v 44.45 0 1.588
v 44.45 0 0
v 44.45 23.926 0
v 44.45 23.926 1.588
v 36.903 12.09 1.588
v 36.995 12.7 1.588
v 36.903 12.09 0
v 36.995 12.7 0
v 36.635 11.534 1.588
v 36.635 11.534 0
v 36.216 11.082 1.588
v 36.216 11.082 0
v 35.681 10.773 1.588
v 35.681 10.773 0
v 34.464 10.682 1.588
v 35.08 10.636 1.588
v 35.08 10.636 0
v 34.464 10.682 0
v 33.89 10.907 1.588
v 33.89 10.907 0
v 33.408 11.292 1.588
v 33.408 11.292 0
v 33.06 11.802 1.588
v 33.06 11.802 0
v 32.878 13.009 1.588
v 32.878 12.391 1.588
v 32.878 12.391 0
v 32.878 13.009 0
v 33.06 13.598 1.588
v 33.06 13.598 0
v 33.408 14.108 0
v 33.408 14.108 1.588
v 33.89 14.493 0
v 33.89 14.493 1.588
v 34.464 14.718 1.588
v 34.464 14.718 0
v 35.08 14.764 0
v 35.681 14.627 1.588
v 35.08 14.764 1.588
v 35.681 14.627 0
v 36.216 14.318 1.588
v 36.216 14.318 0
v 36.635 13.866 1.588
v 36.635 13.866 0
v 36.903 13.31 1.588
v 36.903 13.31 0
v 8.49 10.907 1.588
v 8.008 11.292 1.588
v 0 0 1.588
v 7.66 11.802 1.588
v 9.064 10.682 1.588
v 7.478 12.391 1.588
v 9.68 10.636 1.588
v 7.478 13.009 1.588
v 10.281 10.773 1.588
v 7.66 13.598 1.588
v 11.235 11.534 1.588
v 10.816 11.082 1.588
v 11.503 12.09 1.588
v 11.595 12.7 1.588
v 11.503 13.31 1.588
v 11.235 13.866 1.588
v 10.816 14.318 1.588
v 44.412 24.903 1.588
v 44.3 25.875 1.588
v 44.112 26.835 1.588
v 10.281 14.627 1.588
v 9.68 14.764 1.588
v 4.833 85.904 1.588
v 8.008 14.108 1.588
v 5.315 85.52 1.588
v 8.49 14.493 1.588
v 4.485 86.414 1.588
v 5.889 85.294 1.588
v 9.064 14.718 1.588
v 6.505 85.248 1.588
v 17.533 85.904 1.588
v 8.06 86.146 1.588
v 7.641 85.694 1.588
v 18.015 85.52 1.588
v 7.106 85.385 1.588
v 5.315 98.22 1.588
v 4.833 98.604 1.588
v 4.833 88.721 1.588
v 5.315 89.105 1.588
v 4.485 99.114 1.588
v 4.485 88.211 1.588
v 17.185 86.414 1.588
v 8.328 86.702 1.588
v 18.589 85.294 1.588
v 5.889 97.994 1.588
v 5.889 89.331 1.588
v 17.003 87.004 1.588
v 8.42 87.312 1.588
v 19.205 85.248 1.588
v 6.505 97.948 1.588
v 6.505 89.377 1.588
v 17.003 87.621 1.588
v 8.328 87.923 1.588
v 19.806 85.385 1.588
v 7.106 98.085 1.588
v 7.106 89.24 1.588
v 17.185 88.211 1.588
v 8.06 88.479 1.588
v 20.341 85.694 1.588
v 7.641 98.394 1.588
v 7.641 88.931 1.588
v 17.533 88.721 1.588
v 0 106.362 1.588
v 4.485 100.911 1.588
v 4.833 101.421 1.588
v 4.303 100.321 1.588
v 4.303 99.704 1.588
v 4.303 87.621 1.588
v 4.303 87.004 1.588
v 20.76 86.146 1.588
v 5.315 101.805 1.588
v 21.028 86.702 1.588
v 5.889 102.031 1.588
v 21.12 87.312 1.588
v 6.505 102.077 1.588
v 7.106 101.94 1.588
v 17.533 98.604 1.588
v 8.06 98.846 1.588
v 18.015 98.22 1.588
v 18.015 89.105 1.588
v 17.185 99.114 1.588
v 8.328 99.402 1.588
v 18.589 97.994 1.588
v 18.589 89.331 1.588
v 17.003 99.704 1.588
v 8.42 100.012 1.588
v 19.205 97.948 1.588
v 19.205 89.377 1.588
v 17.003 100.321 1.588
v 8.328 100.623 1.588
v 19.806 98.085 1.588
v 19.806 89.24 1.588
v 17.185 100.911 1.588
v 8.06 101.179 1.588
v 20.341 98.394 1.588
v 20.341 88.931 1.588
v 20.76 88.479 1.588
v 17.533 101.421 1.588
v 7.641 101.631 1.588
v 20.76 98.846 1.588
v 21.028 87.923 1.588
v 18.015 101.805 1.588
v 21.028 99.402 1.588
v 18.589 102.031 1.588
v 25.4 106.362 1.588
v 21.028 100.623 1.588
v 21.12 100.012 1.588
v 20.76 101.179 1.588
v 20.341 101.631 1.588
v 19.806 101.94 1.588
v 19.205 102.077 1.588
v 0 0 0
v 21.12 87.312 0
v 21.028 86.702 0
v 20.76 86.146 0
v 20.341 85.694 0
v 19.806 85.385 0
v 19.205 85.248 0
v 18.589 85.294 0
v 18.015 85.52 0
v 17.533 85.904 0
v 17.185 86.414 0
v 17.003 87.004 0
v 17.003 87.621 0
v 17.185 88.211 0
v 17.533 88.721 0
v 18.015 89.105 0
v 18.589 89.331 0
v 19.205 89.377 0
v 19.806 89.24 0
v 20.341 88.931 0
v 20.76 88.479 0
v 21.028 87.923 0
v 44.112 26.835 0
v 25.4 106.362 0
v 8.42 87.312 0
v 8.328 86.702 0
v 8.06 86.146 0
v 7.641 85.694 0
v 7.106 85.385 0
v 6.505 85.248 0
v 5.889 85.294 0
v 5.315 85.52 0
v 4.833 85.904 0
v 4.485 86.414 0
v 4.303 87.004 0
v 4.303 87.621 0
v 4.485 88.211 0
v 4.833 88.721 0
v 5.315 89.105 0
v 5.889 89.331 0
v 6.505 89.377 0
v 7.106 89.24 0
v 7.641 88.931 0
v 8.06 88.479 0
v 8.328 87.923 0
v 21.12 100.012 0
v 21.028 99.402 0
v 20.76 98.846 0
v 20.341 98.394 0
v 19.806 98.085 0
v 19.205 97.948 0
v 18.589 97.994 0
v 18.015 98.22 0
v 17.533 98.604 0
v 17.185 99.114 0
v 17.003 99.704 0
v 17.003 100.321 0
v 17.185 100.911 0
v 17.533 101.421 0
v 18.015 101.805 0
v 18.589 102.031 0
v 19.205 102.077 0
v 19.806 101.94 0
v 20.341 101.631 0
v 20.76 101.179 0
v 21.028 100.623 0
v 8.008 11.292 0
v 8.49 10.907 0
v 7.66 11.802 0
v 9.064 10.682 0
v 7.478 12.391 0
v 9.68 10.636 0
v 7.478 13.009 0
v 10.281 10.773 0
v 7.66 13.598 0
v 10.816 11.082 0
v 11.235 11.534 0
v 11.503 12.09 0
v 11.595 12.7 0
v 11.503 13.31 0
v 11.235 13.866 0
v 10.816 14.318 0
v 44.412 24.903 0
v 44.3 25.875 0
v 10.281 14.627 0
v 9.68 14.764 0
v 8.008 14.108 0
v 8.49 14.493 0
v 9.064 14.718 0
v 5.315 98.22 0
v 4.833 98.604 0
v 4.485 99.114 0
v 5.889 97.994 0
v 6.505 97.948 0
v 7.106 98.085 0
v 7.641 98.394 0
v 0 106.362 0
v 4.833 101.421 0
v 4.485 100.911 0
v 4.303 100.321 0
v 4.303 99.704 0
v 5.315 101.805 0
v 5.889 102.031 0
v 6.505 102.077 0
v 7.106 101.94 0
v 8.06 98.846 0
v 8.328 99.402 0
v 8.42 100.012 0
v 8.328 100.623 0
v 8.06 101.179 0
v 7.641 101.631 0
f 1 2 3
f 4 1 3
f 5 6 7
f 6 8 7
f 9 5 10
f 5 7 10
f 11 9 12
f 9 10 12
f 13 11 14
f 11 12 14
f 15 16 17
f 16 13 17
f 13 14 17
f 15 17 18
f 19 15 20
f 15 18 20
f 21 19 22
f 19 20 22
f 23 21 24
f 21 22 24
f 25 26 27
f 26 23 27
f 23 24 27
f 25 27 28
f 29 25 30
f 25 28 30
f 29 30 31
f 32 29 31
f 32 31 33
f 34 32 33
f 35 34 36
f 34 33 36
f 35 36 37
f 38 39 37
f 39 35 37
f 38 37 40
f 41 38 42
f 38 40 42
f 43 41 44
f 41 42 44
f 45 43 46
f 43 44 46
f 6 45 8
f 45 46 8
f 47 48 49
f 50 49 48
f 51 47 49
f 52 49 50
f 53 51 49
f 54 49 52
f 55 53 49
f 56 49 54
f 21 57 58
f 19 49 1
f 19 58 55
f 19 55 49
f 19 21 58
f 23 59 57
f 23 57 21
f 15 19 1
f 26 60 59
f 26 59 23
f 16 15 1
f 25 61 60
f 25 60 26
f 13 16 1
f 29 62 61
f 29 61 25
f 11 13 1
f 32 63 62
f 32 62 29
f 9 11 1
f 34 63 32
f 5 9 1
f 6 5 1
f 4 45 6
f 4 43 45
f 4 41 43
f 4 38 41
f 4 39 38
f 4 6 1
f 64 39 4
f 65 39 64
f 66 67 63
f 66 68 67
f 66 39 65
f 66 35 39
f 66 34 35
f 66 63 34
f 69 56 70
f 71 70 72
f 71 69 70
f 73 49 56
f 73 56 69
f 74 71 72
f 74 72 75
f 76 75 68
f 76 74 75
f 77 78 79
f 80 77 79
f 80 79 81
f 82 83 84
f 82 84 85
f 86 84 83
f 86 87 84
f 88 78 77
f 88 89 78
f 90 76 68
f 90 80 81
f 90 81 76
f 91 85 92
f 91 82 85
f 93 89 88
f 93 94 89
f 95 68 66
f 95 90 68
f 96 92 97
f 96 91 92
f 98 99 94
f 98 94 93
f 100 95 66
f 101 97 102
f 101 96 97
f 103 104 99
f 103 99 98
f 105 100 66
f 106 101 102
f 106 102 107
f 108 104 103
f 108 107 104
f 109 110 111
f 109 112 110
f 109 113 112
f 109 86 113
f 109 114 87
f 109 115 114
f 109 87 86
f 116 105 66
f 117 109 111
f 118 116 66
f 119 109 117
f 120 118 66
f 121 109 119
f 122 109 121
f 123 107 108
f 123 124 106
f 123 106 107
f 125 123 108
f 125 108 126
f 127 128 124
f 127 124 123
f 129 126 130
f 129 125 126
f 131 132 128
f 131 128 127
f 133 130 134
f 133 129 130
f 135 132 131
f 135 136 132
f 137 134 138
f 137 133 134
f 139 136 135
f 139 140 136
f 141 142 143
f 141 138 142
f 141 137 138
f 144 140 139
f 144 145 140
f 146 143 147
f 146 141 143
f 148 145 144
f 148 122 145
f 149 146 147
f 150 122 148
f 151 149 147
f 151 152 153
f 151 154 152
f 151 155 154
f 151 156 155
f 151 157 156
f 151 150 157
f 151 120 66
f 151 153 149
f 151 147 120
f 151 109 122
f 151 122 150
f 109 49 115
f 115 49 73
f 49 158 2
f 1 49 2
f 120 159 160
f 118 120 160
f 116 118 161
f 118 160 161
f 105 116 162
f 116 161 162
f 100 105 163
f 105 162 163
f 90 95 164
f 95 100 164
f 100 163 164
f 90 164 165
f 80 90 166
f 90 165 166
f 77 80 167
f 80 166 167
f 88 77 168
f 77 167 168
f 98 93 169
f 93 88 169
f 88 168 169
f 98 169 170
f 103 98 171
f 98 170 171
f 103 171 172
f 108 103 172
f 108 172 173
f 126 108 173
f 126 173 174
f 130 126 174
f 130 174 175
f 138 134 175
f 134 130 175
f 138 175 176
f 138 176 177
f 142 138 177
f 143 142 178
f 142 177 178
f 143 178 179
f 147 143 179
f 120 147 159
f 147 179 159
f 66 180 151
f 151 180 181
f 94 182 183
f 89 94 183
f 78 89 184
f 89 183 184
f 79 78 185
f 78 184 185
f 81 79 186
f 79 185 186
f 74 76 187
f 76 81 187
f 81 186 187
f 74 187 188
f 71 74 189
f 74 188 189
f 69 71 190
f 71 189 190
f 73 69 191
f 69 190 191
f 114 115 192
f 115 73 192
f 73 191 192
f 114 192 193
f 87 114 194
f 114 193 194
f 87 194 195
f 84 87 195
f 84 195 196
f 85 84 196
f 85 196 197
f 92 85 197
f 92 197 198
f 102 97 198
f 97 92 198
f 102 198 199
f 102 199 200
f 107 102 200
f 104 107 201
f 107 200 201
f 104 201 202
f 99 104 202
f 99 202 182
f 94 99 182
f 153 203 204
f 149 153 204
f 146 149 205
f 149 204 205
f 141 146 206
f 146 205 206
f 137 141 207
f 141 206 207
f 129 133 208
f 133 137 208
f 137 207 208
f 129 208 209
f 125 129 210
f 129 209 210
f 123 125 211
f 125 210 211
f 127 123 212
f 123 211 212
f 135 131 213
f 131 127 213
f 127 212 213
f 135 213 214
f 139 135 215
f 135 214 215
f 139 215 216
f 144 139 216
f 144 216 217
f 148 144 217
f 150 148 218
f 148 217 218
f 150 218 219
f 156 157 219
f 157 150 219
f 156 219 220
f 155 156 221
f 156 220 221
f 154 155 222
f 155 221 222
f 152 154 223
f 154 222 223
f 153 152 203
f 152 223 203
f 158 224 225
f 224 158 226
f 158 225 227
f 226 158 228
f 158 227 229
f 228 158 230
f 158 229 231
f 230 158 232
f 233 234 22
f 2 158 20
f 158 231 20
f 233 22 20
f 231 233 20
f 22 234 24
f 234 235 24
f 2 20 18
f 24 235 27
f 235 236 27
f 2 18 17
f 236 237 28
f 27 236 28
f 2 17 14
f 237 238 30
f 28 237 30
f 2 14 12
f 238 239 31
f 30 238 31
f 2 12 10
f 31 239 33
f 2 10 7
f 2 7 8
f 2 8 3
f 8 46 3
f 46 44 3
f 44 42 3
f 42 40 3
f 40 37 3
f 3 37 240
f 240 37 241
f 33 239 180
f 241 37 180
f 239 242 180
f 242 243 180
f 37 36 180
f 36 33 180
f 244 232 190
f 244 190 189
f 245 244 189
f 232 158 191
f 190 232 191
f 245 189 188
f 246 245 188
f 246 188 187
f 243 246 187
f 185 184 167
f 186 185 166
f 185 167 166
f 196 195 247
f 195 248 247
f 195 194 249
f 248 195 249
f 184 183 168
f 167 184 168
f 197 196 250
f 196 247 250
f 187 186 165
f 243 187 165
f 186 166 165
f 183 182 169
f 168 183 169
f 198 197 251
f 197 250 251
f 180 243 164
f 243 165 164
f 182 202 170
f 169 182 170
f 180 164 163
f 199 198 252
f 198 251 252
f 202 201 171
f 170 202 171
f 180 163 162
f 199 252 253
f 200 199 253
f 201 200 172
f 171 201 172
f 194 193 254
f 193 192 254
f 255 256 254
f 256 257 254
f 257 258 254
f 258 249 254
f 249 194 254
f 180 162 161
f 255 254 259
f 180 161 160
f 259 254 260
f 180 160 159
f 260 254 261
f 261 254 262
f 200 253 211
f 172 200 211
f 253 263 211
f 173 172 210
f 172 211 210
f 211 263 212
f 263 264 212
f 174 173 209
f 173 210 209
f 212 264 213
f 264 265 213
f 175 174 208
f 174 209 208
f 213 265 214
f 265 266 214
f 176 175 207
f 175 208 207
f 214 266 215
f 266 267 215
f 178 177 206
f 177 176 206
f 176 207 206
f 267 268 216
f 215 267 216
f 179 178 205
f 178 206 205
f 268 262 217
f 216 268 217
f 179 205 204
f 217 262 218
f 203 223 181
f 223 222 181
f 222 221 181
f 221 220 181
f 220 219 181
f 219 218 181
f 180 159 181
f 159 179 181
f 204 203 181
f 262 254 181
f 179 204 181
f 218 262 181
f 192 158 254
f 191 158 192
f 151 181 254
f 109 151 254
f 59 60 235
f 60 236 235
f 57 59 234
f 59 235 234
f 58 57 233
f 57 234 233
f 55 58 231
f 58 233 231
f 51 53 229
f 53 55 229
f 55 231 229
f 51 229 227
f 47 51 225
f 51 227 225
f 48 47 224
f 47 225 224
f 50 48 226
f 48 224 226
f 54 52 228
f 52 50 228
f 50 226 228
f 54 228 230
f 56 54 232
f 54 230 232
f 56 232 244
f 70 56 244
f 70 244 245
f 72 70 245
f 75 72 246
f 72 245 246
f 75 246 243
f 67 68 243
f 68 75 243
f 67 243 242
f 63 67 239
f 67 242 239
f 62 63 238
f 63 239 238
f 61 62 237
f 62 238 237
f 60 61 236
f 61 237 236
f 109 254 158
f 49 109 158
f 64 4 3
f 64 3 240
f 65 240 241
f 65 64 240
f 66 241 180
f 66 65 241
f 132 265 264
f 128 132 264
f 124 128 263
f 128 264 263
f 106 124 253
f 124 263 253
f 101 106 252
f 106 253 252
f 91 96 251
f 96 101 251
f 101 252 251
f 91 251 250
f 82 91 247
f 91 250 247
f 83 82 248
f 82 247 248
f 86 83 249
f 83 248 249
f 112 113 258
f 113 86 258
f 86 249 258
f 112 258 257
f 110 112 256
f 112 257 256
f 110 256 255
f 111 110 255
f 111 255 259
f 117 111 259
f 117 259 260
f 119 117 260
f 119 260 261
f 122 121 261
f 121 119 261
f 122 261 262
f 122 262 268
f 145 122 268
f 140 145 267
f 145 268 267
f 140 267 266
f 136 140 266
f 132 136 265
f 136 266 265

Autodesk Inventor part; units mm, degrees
ref_plane "YZ Plane" through (0, 0, 0) normal (1, 0, 0) x (0, 1, 0)
ref_plane "XZ Plane" through (0, 0, 0) normal (0, 1, 0) x (-1, 0, 0)
ref_plane "XY Plane" through (0, 0, 0) normal (0, 0, 1) x (1, 0, 0)
sketch "Sketch1" plane through (0, 0, 0) normal (0, 0, 1) x (1, 0, 0)
  line L0 (106.3625, -44.45) -> (0, -44.45)
  line L1 (110.551814, -19.05) -> (110.551814, -44.45)
  line L2 (106.3625, -19.05) -> (110.551814, -19.05)
  line L3 (106.3625, -19.05) -> (110.551814, -19.05)
  line L4 (110.551814, -19.05) -> (110.551814, -22.225)
  line L5 (110.551814, -22.225) -> (106.3625, -22.225)
  line L6 (106.3625, -22.225) -> (106.3625, -19.05)
  line L7 (106.3625, -19.05) -> (106.3625, -44.45)
  line L8 (110.551814, -19.05) -> (110.551814, -44.45)
  line L9 (106.3625, -41.275) -> (110.551814, -41.275)
  line L10 (110.551814, -41.275) -> (110.551814, -44.45)
  line L11 (110.551814, -44.45) -> (106.3625, -44.45)
  line L12 (106.3625, -44.45) -> (106.3625, -41.275)
  point P0 (0, 0)
  point P1 (110.551814, -34.925)
  point P2 (111.304505, 0)
  point P3 (131.506814, -44.45)
  point P4 (131.506814, -19.05)
  dimension "d6" = 25.4
  dimension "d22" = 12.7
  dimension "d54" = 25.4
  dimension "d55" = 106.3625
  dimension "d56" = 25.4
  dimension "d57" = 44.45
  dimension "d58" = 9.525
  dimension "d81" = 6.35
  dimension "d82" = 6.35
  dimension "d85" = 12.7
  dimension "d88" = 12.7
sketch "Sketch1 outline for Plate1" plane through (0, 0, 0) normal (0, 0, 1) x (1, 0, 0)
  line L0 (0, 106.3625) -> (0, 0)
  line L1 (25.4, 106.3625) -> (0, 106.3625)
  line L2 (0, 0) -> (44.45, 0)
  line L3 (44.45, 25.4) -> (25.4, 106.3625)
  line L4 (44.45, 0) -> (44.45, 25.4)
  circle A0 centre (9.525, 12.7) radius 2.0701
  circle A1 centre (34.925, 12.7) radius 2.0701
  circle A2 centre (6.35, 87.3125) radius 2.0701
  circle A3 centre (6.35, 100.0125) radius 2.0701
  circle A4 centre (19.05, 87.3125) radius 2.0701
  circle A5 centre (19.05, 100.0125) radius 2.0701
extrude "Plate1" add sketch "Sketch1 outline for Plate1" along normal blind 1.5875
ref_plane "Work Plane1" through (0, 110.8075, 25.4) normal (0, 1, 0) x (1, 0, 0)
sketch "Sketch4 outline for Cut3" plane through (0, 110.8075, 25.4) normal (0, 1, 0) x (1, 0, 0)
  line L0 (0, 20.955) -> (0, 0)
  line L1 (0, 0) -> (25.4, 0)
  line L2 (25.4, 0) -> (25.4, 20.955)
  line L3 (25.4, 20.955) -> (0, 20.955)
extrude "Cut3" cut sketch "Sketch4 outline for Cut3" against normal blind 1.5875
fillet "Fillet5" radius 12.7 1 edges at (44.45, 25.4, 0.7937)
sketch "Sketch4" plane through (0, 110.8075, 25.4) normal (0, 1, 0) x (1, 0, 0)
  line L0 (25.4, 0) -> (0, 0)
  circle A0 centre (19.05, 6.35) radius 2.3749
  line L1 (0, 0) -> (0, 20.955)
  line L2 (0, 20.955) -> (25.4, 20.955)
  line L3 (25.4, 20.955) -> (25.4, 21.413463)
  line L4 (21.135301, 0) -> (22.225, 0)
  line L5 (0, 0) -> (0, 20.955)
  line L6 (25.4, 20.955) -> (0, 20.955)
  line L7 (25.4, 20.955) -> (25.4, 17.78)
  line L8 (25.4, 17.78) -> (25.4, 9.525)
  line L9 (12.7, 9.525) -> (12.7, 20.955)
  arc A1 (12.7, 9.525) -> (22.225, 0) centre (22.225, 9.525) ccw
  line L10 (25.4, 20.955) -> (25.4, 0)
  line L11 (0, 0) -> (25.4, 0)
  line L12 (25.4, 0) -> (25.4, 20.955)
  point P0 (0, 25.4)
  point P1 (12.7, 0)
  point P2 (25.4, 0)
  point P3 (12.7, 0)
  dimension "d28" = 4.7498
  dimension "d29" = 6.35
  dimension "d34" = 19.05
  dimension "d47" = 3.175
  dimension "d48" = 6.35
  dimension "d49" = 6.35
  dimension "d50" = 9.525
equation "\"d51\" = Thickness"
equation "\"BendRadius\" = Thickness"
equation "\"BendReliefWidth\" = Thickness"
equation "\"BendReliefDepth\" = 0.5 * Thickness"
equation "\"CornerReliefSize\" = 4 * Thickness"
equation "\"MinimumRemnant\" = 2 * Thickness"
equation "\"TransitionRadius\" = BendRadius"
equation "\"JacobiRadiusSize\" = BendRadius"
equation "\"GapSize\" = Thickness"
equation "\"d11\" = BendRadius"
equation "\"Thickness\" = 1.5875"
properties part number "Pneumatic Piston Front Flange (Left Custom)" material "Aluminum 6061"
